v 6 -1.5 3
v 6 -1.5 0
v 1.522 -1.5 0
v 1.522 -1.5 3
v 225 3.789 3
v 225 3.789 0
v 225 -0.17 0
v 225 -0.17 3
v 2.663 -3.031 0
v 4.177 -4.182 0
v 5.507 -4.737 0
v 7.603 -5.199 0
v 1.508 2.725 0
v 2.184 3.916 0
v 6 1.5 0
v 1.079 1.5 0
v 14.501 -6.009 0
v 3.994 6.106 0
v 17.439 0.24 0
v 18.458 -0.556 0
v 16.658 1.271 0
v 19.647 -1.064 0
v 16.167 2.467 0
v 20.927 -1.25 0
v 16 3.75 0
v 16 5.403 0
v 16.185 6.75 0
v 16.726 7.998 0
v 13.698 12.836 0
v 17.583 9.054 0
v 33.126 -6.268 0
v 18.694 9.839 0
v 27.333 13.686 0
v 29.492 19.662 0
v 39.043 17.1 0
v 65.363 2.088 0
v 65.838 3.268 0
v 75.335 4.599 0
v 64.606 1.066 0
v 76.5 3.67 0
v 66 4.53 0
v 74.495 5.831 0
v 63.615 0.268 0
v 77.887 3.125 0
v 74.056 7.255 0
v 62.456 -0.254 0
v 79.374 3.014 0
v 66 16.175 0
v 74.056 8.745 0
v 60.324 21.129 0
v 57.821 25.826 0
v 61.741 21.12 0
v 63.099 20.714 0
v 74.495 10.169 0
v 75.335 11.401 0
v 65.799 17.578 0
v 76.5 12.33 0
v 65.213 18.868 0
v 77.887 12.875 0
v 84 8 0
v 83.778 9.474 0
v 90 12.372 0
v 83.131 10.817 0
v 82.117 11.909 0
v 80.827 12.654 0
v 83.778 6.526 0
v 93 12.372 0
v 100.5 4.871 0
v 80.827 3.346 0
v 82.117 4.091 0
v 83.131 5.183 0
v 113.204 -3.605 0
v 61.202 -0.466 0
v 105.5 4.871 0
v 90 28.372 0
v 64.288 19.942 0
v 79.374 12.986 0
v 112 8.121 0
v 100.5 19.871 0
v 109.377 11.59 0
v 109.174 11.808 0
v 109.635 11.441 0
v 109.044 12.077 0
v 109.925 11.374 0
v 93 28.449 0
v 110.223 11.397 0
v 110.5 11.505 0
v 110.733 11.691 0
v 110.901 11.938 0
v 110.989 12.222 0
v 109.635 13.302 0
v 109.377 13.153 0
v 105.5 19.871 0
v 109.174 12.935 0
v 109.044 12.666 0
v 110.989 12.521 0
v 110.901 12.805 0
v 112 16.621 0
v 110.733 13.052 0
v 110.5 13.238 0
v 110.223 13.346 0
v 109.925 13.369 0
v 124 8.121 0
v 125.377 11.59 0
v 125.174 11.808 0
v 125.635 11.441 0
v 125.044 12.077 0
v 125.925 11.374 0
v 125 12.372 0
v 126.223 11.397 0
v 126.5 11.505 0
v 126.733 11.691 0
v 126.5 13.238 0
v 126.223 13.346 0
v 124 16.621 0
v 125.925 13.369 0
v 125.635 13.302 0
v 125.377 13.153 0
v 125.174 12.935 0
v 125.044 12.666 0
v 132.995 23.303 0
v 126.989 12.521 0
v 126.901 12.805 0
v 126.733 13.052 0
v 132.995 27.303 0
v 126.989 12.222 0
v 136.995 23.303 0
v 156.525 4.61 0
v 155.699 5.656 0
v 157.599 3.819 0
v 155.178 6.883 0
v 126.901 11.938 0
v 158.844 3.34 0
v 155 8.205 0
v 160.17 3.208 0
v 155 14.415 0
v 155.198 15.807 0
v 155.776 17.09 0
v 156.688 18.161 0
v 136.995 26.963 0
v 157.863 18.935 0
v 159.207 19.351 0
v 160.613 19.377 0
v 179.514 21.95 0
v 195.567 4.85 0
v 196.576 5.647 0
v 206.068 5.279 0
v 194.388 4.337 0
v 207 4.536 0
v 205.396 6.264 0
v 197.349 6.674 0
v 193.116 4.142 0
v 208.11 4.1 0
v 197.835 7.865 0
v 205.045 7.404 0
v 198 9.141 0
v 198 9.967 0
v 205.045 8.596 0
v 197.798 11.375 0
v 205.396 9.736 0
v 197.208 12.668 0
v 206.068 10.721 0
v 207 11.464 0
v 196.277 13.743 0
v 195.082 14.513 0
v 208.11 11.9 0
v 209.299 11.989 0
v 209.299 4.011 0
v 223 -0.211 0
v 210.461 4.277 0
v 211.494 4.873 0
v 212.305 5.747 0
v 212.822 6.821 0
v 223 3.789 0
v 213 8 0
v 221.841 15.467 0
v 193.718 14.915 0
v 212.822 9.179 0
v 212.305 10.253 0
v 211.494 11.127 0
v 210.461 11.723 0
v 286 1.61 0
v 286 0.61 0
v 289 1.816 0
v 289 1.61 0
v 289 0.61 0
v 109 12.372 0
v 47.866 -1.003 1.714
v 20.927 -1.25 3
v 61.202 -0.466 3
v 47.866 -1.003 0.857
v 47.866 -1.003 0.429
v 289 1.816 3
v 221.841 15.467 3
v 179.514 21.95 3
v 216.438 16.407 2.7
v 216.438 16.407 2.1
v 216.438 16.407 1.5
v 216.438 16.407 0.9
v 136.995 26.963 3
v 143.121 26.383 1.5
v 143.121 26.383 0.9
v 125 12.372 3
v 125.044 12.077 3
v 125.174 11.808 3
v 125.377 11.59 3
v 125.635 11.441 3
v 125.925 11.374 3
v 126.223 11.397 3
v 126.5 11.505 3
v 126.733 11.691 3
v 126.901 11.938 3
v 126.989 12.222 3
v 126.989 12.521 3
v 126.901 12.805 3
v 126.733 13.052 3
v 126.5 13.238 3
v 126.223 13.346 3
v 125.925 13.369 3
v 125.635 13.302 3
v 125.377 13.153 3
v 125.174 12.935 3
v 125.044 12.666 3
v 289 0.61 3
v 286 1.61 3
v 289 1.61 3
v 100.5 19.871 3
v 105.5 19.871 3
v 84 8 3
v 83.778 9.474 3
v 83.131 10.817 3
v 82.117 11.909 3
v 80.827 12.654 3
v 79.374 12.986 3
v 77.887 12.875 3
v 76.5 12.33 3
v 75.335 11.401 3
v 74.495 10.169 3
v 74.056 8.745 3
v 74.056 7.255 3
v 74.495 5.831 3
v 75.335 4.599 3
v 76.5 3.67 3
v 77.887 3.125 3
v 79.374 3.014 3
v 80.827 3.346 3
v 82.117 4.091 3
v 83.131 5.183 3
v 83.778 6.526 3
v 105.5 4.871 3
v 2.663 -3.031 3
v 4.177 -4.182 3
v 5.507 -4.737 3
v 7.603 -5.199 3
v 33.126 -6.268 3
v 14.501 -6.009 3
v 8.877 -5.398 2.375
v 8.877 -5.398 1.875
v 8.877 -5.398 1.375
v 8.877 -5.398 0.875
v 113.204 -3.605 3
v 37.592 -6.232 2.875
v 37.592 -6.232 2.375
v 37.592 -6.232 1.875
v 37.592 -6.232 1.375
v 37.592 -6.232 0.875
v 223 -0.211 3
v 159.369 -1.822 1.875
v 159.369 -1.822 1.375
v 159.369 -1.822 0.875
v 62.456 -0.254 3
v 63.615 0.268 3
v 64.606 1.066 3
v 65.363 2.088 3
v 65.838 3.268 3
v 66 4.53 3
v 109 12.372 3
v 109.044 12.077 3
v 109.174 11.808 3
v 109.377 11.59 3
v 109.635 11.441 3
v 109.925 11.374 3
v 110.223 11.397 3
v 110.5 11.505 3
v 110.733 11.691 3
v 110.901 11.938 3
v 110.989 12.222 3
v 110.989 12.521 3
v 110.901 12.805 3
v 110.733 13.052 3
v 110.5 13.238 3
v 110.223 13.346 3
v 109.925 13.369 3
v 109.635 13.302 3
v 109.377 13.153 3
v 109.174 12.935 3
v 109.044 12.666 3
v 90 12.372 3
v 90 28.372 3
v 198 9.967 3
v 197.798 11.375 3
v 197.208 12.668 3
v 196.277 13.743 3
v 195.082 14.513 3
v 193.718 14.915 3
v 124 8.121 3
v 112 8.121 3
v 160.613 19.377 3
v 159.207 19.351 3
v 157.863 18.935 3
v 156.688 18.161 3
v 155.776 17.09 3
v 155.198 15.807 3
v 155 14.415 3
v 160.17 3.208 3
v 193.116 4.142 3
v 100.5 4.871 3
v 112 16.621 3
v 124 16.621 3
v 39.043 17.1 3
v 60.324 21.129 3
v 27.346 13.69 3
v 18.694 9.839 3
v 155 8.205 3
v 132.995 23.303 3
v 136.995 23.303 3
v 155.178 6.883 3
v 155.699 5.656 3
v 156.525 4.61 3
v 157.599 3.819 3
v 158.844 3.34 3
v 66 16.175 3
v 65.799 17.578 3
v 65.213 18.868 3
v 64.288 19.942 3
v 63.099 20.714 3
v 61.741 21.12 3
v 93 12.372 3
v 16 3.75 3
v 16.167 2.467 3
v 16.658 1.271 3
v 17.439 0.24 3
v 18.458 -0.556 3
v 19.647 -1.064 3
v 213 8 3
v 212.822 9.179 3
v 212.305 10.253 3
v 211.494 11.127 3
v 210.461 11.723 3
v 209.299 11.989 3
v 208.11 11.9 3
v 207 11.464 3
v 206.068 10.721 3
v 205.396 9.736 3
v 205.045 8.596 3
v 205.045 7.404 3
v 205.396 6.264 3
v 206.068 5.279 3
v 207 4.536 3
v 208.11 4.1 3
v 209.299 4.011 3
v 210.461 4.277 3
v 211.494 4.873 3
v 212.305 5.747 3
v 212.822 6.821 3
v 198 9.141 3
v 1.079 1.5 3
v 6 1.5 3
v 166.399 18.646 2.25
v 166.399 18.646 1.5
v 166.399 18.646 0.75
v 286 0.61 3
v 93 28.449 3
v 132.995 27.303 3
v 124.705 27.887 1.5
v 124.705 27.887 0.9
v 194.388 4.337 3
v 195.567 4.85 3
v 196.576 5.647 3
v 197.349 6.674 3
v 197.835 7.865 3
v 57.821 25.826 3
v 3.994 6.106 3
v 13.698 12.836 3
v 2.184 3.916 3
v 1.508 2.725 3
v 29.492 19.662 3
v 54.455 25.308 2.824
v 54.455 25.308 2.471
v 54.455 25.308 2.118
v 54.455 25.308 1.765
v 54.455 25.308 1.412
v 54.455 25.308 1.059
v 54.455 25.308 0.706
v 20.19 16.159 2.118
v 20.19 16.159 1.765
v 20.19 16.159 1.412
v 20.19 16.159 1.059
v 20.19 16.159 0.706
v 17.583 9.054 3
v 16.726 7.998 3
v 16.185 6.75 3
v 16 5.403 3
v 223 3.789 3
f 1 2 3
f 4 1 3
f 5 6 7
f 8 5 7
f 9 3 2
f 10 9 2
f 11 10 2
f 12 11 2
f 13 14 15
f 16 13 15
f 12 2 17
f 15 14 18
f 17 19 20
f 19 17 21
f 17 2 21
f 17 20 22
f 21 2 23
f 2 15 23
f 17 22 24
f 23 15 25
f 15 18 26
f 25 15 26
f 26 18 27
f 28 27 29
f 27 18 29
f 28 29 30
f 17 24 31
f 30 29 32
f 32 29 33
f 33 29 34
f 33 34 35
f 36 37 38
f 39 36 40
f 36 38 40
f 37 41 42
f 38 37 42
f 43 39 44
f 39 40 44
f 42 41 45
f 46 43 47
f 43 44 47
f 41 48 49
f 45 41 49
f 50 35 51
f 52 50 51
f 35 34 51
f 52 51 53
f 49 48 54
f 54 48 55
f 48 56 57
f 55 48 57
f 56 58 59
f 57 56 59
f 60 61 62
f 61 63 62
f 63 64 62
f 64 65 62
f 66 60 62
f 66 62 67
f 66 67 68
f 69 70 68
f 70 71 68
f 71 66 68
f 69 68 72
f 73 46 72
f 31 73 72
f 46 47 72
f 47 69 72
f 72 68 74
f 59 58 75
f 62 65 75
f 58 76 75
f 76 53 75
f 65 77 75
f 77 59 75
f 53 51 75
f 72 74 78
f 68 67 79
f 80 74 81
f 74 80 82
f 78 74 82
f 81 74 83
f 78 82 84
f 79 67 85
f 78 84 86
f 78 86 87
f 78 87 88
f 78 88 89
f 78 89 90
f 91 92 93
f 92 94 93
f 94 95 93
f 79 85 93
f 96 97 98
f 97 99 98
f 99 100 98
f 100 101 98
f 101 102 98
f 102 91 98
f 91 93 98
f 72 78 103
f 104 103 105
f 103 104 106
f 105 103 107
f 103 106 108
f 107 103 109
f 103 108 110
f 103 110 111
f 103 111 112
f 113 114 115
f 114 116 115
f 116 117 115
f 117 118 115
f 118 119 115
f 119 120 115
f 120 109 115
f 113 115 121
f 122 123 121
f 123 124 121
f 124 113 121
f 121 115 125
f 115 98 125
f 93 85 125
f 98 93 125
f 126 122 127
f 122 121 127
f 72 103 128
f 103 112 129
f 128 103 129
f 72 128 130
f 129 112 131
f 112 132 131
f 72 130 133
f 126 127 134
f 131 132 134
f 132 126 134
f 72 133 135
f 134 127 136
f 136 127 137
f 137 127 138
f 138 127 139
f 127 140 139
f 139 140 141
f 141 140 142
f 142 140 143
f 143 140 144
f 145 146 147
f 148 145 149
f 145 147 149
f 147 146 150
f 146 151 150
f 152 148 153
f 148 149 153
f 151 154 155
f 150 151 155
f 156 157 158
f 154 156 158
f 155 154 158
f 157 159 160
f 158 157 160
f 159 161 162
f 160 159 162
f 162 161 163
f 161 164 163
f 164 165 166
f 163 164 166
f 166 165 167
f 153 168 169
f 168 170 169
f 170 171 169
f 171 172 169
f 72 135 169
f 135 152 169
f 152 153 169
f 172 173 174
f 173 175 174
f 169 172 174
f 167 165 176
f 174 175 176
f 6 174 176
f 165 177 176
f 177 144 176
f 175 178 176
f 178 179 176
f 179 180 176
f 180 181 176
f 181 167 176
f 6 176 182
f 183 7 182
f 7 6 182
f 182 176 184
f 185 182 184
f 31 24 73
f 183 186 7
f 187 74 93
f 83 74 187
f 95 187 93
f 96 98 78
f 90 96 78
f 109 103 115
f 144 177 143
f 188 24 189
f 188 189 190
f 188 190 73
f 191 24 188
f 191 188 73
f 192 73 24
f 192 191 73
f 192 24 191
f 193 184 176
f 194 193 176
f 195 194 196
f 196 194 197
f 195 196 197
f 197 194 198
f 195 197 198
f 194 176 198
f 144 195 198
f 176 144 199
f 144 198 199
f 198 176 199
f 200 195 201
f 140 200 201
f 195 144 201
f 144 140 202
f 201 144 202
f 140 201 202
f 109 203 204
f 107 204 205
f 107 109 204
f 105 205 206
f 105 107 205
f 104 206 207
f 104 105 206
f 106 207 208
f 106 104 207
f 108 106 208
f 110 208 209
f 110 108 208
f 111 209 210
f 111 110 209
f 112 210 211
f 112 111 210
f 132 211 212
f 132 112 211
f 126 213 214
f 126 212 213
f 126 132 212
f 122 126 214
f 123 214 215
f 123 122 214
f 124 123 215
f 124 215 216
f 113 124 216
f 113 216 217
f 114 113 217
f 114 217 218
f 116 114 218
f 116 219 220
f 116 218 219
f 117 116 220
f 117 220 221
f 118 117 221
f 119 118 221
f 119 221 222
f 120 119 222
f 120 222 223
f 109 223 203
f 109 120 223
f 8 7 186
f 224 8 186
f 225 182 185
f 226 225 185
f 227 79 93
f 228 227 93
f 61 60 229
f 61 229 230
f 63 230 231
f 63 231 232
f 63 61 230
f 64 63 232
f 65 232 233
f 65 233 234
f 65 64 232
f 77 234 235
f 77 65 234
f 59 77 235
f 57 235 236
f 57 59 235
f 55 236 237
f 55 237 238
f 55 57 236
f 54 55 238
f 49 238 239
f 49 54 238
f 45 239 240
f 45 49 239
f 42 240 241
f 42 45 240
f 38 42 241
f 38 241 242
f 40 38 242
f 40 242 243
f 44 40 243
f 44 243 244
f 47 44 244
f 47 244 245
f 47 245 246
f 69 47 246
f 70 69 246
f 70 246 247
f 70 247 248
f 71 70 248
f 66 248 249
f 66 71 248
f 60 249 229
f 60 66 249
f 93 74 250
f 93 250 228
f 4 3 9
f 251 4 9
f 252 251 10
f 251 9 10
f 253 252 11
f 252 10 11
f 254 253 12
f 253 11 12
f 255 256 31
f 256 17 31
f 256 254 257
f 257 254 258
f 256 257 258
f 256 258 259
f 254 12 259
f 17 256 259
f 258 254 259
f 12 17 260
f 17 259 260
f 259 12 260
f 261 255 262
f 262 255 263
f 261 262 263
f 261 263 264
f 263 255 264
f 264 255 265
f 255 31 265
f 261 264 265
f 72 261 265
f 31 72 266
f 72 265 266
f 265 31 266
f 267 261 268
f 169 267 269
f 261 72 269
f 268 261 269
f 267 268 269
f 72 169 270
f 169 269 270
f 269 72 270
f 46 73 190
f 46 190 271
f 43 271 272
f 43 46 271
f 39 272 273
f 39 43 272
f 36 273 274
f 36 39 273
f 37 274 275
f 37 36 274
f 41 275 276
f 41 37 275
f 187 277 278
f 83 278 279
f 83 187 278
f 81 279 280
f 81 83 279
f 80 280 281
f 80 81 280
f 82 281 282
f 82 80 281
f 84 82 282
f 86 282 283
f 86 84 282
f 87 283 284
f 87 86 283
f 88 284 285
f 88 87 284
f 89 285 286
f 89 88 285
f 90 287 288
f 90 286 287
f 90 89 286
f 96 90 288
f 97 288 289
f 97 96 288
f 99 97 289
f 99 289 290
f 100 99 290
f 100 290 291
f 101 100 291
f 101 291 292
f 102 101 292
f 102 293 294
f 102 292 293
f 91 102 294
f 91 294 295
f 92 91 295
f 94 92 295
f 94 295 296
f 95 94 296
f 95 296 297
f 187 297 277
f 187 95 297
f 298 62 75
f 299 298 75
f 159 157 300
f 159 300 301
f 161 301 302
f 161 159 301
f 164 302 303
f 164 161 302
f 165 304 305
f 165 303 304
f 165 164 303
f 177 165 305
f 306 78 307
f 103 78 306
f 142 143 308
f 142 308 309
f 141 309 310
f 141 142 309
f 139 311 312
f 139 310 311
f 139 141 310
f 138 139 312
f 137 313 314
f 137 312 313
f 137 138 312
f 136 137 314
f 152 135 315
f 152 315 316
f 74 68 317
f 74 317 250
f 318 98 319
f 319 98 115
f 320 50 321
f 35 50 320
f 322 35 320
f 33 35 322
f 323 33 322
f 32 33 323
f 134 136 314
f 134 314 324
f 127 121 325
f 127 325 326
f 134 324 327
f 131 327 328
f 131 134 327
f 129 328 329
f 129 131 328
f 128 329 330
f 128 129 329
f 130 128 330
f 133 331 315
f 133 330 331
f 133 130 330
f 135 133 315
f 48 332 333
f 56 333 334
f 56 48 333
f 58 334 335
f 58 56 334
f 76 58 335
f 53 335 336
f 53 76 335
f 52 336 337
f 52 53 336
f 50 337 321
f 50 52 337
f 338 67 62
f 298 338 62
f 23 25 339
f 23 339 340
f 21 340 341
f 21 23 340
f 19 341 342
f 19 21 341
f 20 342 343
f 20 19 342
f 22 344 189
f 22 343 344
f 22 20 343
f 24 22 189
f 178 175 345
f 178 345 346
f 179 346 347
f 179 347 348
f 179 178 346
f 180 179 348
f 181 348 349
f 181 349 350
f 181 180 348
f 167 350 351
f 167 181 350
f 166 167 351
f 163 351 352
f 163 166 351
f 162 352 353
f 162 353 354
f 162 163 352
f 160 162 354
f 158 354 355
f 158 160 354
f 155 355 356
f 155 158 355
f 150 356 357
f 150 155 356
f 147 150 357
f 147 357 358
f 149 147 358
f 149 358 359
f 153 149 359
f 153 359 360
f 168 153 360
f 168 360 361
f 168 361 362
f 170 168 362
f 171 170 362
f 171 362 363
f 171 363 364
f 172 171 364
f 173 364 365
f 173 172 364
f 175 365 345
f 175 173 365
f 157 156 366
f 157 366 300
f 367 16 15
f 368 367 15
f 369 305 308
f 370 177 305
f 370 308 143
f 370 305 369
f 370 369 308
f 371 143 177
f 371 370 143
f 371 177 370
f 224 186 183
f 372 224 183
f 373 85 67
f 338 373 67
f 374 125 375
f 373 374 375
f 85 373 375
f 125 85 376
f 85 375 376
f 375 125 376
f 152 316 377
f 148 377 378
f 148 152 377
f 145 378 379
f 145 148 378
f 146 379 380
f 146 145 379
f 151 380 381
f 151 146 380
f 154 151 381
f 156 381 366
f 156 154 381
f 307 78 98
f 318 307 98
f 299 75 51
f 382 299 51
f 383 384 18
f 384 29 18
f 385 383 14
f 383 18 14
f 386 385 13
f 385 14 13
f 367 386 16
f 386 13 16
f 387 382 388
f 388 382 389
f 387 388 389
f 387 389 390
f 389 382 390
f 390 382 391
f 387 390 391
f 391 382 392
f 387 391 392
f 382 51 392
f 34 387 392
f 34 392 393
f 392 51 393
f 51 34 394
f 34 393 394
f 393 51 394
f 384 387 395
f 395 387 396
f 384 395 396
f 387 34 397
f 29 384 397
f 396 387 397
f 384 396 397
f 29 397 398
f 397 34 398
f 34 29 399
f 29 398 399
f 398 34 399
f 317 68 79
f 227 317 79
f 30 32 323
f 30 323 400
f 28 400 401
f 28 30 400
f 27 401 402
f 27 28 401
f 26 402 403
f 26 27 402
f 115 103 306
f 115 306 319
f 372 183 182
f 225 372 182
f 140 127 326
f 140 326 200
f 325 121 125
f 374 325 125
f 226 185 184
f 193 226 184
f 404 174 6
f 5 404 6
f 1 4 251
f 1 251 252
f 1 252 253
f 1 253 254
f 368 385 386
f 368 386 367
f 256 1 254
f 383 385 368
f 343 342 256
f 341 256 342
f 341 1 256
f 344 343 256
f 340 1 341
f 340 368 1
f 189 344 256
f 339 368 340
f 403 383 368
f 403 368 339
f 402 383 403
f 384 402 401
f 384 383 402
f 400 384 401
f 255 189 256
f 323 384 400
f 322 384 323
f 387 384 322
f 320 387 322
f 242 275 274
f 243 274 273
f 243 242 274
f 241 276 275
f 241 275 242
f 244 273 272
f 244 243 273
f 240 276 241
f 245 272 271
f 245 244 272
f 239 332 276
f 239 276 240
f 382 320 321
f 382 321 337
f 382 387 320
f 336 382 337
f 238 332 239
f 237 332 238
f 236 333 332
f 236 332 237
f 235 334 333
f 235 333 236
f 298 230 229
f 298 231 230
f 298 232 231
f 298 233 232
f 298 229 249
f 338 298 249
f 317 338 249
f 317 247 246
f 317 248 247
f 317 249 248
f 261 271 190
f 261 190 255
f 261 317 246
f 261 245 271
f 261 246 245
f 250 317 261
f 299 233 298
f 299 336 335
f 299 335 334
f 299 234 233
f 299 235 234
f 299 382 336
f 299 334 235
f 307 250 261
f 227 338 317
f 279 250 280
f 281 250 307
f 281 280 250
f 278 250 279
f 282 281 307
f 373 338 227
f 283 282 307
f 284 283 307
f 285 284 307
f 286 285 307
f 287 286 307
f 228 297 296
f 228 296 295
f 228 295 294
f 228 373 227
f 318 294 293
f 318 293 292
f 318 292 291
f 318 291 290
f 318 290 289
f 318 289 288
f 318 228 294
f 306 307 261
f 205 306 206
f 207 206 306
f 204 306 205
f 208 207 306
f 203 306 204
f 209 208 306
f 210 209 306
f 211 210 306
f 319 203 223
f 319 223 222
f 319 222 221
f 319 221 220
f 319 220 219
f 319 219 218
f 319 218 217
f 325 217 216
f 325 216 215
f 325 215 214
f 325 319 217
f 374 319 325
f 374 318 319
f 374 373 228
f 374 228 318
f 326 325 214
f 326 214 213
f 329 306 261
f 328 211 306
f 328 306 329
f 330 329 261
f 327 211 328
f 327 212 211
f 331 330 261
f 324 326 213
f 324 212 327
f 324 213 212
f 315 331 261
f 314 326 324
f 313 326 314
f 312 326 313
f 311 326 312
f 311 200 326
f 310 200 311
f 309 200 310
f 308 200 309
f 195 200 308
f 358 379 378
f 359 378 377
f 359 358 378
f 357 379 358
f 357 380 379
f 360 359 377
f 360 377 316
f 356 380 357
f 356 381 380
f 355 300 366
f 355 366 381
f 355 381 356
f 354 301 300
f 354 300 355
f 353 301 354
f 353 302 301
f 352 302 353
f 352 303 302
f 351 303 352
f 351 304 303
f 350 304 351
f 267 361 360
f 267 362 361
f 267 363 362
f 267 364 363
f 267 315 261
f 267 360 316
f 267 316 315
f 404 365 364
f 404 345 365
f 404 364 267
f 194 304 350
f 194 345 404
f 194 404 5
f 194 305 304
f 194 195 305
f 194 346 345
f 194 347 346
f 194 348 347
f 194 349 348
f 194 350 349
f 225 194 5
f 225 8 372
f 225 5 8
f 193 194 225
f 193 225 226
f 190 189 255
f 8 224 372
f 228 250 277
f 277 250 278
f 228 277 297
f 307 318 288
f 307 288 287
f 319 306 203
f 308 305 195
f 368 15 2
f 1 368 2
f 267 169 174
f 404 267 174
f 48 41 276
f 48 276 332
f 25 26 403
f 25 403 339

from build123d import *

# Parameters (mm, degrees)
SKETCH_1_R          = 5
SKETCH_1_R_2        = 4
EXTRUDE_1_DEPTH     = 3
SKETCH_3_W          = 5
SKETCH_3_H          = 15
SKETCH_3_W_2        = 12
SKETCH_3_H_2        = 8.5
SKETCH_3_R          = 1
SKETCH_3_W_3        = 4
SKETCH_3_H_3        = 4
CUT_EXTRUDE_2_DEPTH = 291.422386836


with BuildPart() as part:
    # 草图1 → 凸台-拉伸1 (new body)
    with BuildSketch(Plane.XY):
        with BuildLine():
            Line((90, 12.3715), (90, 28.372426217))
            add(Edge.make_bspline(
                [(90, 28.372426217), (89.259446982, 28.350928743), (82.363996343, 28.13322439), (72.403347361, 27.586524792), (60.185862052, 26.226268085), (51.080991088, 24.79810862), (42.033943524, 23.000087944), (34.581994337, 21.174922903), (28.697351661, 19.44563851), (24.361981086, 17.983441115), (20.174828998, 16.207949367), (16.078941989, 14.139912989), (12.040296713, 11.946766626), (8.14011433, 9.56039573), (5.153679337, 7.316395724), (3.100060439, 5.200618052), (1.813825976, 3.470730924), (1.237398467, 2.180506339), (1.085380705, 1.529058937), (1.078882286, 1.5)],
                knots=[0.345773533, 0.345773533, 0.345773533, 0.345773533, 0.349398211, 0.379527288, 0.394591827, 0.409656366, 0.424720905, 0.439785444, 0.447317713, 0.454849983, 0.462382252, 0.469914522, 0.477446791, 0.484979061, 0.49251133, 0.496277465, 0.5000436, 0.503809734, 0.503985678, 0.503985678, 0.503985678, 0.503985678], degree=3))
            Line((1.078882286, 1.5), (6, 1.5))
            Line((6, 1.5), (6, -1.5))
            Line((6, -1.5), (1.522379628, -1.5))
            add(Edge.make_bspline(
                [(1.522379628, -1.5), (1.617903461, -1.678770523), (2.068186491, -2.42442122), (3.143139608, -3.601090845), (4.854253, -4.619355756), (6.927567017, -5.105597911), (9.209034621, -5.454839075), (12.219971865, -5.84289763), (16.020132359, -6.14266222), (20.609524976, -6.2611368), (25.231457517, -6.286948592), (31.397380169, -6.280305851), (39.107274969, -6.240736398), (48.336813051, -6.022096429), (57.579935967, -5.612990736), (66.840654471, -5.242934226), (76.096556555, -4.921715721), (88.435998513, -4.515955408), (103.853120896, -3.973102953), (122.354625015, -3.248110744), (140.857835973, -2.495489966), (159.368527813, -1.804089638), (177.884173919, -1.222493213), (196.4033921, -0.774877257), (211.439290174, -0.454334834), (220.305576898, -0.265987383), (223, -0.210849605)],
                knots=[0.510182255, 0.510182255, 0.510182255, 0.510182255, 0.511342004, 0.515108139, 0.518874273, 0.522640408, 0.526406543, 0.530172677, 0.537704947, 0.545237216, 0.552769486, 0.560301755, 0.575366294, 0.590430833, 0.605495372, 0.620559911, 0.63562445, 0.650688989, 0.680818067, 0.710947144, 0.741076222, 0.7712053, 0.801334378, 0.831463456, 0.861592533, 0.874744372, 0.874744372, 0.874744372, 0.874744372], degree=3))
            Line((223, -0.210849605), (223, 3.788737263))
            Line((223, 3.788737263), (225, 3.788737263))
            Line((225, 3.788737263), (225, -0.170338801))
            add(Edge.make_bspline(
                [(225, -0.170338801), (227.811595191, -0.114017747), (236.796798206, 0.056910764), (251.961175933, 0.256656825), (270.471854229, 0.429163033), (282.824771355, 0.587434741), (289, 0.610062865)],
                knots=[0.877998396, 0.877998396, 0.877998396, 0.877998396, 0.891721611, 0.921850689, 0.951979767, 0.982108845, 0.982108845, 0.982108845, 0.982108845], degree=3))
            Line((289, 0.610062865), (286, 0.610062865))
            Line((286, 0.610062865), (286, 1.610062865))
            Line((286, 1.610062865), (289, 1.610062865))
            Line((289, 1.610062865), (289, 1.816246039))
            add(Edge.make_bspline(
                [(289, 1.816246039), (276.957314444, 4.502285023), (258.861554155, 8.397620333), (234.648247971, 13.152786595), (216.448478593, 16.478914183), (198.182873559, 19.371550405), (179.850571346, 21.924148488), (161.503162682, 24.358614825), (143.127892269, 26.473190985), (124.712239059, 28.043780086), (107.994173705, 28.616385423), (97.416270032, 28.546670082), (93, 28.44913561)],
                knots=[0.017978355, 0.017978355, 0.017978355, 0.017978355, 0.07823651, 0.108365588, 0.138494666, 0.168623744, 0.198752821, 0.228881899, 0.259010977, 0.289140055, 0.319269133, 0.340879606, 0.340879606, 0.340879606, 0.340879606], degree=3))
            Line((93, 28.44913561), (93, 12.3715))
            Line((93, 12.3715), (90, 12.3715))
        make_face()
        with Locations((79, 8)):
            Circle(SKETCH_1_R, mode=Mode.SUBTRACT)
        with Locations((209, 8)):
            Circle(SKETCH_1_R_2, mode=Mode.SUBTRACT)
    extrude(amount=EXTRUDE_1_DEPTH)

    # 草图3 → 切除-拉伸2 (cut, through all)
    with BuildSketch(Plane.XY):
        with Locations((103, 12.3715)):
            Rectangle(SKETCH_3_W, SKETCH_3_H)
        with Locations((118, 12.3715)):
            Rectangle(SKETCH_3_W_2, SKETCH_3_H_2)
        with Locations(Location((110, 12.3715, 0), (0, 0, 180))):
            Circle(SKETCH_3_R)
        with Locations(Location((126, 12.3715, 0), (0, 0, 180))):
            Circle(SKETCH_3_R)
        with Locations((134.995432672, 25.302899085)):
            Rectangle(SKETCH_3_W_3, SKETCH_3_H_3)
        with BuildLine():
            add(Edge.make_bspline(
                [(193.718444833, 14.915410202), (192.779013077, 15.051811632), (191.839123333, 15.187073825), (186.824226186, 15.902901834), (182.740892869, 16.465870736), (174.565909682, 17.575800313), (170.481299177, 18.120965891), (164.469973656, 18.894543341), (162.541485429, 19.138417507), (160.613475955, 19.376775938)],
                knots=[0.485575284, 0.485575284, 0.485575284, 0.485575284, 0.5, 0.5, 0.5625, 0.5625, 0.625, 0.625, 0.654532252, 0.654532252, 0.654532252, 0.654532252], degree=3))
            ThreePointArc((160.613475955, 19.376775938), (156.688458046, 18.160710613), (155, 14.41455393))
            Line((155, 14.41455393), (155, 8.204846233))
            ThreePointArc((155, 8.204846233), (156.525241738, 4.609563904), (160.17042201, 3.207751443))
            add(Edge.make_bspline(
                [(160.17042201, 3.207751443), (162.389721662, 3.283438922), (164.609319497, 3.356780918), (171.504636491, 3.576232826), (176.18199895, 3.713351663), (184.945921303, 3.946800138), (189.03214497, 4.046860263), (193.116453453, 4.14201244)],
                knots=[0.720326449, 0.720326449, 0.720326449, 0.720326449, 0.75, 0.75, 0.8125, 0.8125, 0.867133534, 0.867133534, 0.867133534, 0.867133534], degree=3))
            ThreePointArc((193.116453453, 4.14201244), (196.576469437, 5.64653729), (198, 9.140656115))
            Line((198, 9.140656115), (198, 9.967295711))
            ThreePointArc((198, 9.967295711), (196.781019979, 13.238975389), (193.718444833, 14.915410202))
        make_face()
        with BuildLine():
            add(Edge.make_bspline(
                [(20.926673148, -1.249876658), (21.809693827, -1.262827876), (22.70041751, -1.270722289), (24.744752026, -1.282014543), (25.903390676, -1.283802206), (29.38108188, -1.283541675), (31.709604831, -1.277171959), (36.343989553, -1.248263334), (38.652190318, -1.223511787), (43.261210505, -1.138923387), (45.563329713, -1.080117385), (50.168153725, -0.92677743), (52.481550313, -0.831144642), (56.932408226, -0.642663317), (59.067384966, -0.552312083), (61.20153145, -0.466222597)],
                knots=[0.097228806, 0.097228806, 0.097228806, 0.097228806, 0.109375, 0.109375, 0.125, 0.125, 0.15625, 0.15625, 0.1875, 0.1875, 0.21875, 0.21875, 0.25, 0.25, 0.27850067, 0.27850067, 0.27850067, 0.27850067], degree=3))
            ThreePointArc((61.20153145, -0.466222597), (64.606082171, 1.066165303), (66, 4.529714259))
            Line((66, 4.529714259), (66, 16.175207171))
            ThreePointArc((66, 16.175207171), (64.287676463, 19.942325894), (60.32352661, 21.129234195))
            add(Edge.make_bspline(
                [(60.32352661, 21.129234195), (59.143282742, 20.968071656), (57.964431768, 20.796736398), (53.109249428, 20.046773379), (49.445857595, 19.384253181), (42.158673028, 17.868714577), (38.533379611, 17.019586343), (33.148990447, 15.546220745), (31.362942012, 15.022439399), (27.821005995, 13.880218625), (26.067238608, 13.253271835), (22.635818059, 11.812670552), (20.957942753, 11.004847704), (19.099592195, 10.049689097), (18.896441621, 9.944700093), (18.693547477, 9.839213217)],
                knots=[0.029920383, 0.029920383, 0.029920383, 0.029920383, 0.033494004, 0.033494004, 0.044658672, 0.044658672, 0.05582334, 0.05582334, 0.061405674, 0.061405674, 0.066988008, 0.066988008, 0.072570342, 0.072570342, 0.073256353, 0.073256353, 0.073256353, 0.073256353], degree=3))
            ThreePointArc((18.693547477, 9.839213217), (16.726110517, 7.997937304), (16, 5.402967421))
            Line((16, 5.402967421), (16, 3.749585631))
            ThreePointArc((16, 3.749585631), (17.438635496, 0.240072435), (20.926673148, -1.249876658))
        make_face()
    extrude(amount=CUT_EXTRUDE_2_DEPTH, mode=Mode.SUBTRACT)


solid = part.part
